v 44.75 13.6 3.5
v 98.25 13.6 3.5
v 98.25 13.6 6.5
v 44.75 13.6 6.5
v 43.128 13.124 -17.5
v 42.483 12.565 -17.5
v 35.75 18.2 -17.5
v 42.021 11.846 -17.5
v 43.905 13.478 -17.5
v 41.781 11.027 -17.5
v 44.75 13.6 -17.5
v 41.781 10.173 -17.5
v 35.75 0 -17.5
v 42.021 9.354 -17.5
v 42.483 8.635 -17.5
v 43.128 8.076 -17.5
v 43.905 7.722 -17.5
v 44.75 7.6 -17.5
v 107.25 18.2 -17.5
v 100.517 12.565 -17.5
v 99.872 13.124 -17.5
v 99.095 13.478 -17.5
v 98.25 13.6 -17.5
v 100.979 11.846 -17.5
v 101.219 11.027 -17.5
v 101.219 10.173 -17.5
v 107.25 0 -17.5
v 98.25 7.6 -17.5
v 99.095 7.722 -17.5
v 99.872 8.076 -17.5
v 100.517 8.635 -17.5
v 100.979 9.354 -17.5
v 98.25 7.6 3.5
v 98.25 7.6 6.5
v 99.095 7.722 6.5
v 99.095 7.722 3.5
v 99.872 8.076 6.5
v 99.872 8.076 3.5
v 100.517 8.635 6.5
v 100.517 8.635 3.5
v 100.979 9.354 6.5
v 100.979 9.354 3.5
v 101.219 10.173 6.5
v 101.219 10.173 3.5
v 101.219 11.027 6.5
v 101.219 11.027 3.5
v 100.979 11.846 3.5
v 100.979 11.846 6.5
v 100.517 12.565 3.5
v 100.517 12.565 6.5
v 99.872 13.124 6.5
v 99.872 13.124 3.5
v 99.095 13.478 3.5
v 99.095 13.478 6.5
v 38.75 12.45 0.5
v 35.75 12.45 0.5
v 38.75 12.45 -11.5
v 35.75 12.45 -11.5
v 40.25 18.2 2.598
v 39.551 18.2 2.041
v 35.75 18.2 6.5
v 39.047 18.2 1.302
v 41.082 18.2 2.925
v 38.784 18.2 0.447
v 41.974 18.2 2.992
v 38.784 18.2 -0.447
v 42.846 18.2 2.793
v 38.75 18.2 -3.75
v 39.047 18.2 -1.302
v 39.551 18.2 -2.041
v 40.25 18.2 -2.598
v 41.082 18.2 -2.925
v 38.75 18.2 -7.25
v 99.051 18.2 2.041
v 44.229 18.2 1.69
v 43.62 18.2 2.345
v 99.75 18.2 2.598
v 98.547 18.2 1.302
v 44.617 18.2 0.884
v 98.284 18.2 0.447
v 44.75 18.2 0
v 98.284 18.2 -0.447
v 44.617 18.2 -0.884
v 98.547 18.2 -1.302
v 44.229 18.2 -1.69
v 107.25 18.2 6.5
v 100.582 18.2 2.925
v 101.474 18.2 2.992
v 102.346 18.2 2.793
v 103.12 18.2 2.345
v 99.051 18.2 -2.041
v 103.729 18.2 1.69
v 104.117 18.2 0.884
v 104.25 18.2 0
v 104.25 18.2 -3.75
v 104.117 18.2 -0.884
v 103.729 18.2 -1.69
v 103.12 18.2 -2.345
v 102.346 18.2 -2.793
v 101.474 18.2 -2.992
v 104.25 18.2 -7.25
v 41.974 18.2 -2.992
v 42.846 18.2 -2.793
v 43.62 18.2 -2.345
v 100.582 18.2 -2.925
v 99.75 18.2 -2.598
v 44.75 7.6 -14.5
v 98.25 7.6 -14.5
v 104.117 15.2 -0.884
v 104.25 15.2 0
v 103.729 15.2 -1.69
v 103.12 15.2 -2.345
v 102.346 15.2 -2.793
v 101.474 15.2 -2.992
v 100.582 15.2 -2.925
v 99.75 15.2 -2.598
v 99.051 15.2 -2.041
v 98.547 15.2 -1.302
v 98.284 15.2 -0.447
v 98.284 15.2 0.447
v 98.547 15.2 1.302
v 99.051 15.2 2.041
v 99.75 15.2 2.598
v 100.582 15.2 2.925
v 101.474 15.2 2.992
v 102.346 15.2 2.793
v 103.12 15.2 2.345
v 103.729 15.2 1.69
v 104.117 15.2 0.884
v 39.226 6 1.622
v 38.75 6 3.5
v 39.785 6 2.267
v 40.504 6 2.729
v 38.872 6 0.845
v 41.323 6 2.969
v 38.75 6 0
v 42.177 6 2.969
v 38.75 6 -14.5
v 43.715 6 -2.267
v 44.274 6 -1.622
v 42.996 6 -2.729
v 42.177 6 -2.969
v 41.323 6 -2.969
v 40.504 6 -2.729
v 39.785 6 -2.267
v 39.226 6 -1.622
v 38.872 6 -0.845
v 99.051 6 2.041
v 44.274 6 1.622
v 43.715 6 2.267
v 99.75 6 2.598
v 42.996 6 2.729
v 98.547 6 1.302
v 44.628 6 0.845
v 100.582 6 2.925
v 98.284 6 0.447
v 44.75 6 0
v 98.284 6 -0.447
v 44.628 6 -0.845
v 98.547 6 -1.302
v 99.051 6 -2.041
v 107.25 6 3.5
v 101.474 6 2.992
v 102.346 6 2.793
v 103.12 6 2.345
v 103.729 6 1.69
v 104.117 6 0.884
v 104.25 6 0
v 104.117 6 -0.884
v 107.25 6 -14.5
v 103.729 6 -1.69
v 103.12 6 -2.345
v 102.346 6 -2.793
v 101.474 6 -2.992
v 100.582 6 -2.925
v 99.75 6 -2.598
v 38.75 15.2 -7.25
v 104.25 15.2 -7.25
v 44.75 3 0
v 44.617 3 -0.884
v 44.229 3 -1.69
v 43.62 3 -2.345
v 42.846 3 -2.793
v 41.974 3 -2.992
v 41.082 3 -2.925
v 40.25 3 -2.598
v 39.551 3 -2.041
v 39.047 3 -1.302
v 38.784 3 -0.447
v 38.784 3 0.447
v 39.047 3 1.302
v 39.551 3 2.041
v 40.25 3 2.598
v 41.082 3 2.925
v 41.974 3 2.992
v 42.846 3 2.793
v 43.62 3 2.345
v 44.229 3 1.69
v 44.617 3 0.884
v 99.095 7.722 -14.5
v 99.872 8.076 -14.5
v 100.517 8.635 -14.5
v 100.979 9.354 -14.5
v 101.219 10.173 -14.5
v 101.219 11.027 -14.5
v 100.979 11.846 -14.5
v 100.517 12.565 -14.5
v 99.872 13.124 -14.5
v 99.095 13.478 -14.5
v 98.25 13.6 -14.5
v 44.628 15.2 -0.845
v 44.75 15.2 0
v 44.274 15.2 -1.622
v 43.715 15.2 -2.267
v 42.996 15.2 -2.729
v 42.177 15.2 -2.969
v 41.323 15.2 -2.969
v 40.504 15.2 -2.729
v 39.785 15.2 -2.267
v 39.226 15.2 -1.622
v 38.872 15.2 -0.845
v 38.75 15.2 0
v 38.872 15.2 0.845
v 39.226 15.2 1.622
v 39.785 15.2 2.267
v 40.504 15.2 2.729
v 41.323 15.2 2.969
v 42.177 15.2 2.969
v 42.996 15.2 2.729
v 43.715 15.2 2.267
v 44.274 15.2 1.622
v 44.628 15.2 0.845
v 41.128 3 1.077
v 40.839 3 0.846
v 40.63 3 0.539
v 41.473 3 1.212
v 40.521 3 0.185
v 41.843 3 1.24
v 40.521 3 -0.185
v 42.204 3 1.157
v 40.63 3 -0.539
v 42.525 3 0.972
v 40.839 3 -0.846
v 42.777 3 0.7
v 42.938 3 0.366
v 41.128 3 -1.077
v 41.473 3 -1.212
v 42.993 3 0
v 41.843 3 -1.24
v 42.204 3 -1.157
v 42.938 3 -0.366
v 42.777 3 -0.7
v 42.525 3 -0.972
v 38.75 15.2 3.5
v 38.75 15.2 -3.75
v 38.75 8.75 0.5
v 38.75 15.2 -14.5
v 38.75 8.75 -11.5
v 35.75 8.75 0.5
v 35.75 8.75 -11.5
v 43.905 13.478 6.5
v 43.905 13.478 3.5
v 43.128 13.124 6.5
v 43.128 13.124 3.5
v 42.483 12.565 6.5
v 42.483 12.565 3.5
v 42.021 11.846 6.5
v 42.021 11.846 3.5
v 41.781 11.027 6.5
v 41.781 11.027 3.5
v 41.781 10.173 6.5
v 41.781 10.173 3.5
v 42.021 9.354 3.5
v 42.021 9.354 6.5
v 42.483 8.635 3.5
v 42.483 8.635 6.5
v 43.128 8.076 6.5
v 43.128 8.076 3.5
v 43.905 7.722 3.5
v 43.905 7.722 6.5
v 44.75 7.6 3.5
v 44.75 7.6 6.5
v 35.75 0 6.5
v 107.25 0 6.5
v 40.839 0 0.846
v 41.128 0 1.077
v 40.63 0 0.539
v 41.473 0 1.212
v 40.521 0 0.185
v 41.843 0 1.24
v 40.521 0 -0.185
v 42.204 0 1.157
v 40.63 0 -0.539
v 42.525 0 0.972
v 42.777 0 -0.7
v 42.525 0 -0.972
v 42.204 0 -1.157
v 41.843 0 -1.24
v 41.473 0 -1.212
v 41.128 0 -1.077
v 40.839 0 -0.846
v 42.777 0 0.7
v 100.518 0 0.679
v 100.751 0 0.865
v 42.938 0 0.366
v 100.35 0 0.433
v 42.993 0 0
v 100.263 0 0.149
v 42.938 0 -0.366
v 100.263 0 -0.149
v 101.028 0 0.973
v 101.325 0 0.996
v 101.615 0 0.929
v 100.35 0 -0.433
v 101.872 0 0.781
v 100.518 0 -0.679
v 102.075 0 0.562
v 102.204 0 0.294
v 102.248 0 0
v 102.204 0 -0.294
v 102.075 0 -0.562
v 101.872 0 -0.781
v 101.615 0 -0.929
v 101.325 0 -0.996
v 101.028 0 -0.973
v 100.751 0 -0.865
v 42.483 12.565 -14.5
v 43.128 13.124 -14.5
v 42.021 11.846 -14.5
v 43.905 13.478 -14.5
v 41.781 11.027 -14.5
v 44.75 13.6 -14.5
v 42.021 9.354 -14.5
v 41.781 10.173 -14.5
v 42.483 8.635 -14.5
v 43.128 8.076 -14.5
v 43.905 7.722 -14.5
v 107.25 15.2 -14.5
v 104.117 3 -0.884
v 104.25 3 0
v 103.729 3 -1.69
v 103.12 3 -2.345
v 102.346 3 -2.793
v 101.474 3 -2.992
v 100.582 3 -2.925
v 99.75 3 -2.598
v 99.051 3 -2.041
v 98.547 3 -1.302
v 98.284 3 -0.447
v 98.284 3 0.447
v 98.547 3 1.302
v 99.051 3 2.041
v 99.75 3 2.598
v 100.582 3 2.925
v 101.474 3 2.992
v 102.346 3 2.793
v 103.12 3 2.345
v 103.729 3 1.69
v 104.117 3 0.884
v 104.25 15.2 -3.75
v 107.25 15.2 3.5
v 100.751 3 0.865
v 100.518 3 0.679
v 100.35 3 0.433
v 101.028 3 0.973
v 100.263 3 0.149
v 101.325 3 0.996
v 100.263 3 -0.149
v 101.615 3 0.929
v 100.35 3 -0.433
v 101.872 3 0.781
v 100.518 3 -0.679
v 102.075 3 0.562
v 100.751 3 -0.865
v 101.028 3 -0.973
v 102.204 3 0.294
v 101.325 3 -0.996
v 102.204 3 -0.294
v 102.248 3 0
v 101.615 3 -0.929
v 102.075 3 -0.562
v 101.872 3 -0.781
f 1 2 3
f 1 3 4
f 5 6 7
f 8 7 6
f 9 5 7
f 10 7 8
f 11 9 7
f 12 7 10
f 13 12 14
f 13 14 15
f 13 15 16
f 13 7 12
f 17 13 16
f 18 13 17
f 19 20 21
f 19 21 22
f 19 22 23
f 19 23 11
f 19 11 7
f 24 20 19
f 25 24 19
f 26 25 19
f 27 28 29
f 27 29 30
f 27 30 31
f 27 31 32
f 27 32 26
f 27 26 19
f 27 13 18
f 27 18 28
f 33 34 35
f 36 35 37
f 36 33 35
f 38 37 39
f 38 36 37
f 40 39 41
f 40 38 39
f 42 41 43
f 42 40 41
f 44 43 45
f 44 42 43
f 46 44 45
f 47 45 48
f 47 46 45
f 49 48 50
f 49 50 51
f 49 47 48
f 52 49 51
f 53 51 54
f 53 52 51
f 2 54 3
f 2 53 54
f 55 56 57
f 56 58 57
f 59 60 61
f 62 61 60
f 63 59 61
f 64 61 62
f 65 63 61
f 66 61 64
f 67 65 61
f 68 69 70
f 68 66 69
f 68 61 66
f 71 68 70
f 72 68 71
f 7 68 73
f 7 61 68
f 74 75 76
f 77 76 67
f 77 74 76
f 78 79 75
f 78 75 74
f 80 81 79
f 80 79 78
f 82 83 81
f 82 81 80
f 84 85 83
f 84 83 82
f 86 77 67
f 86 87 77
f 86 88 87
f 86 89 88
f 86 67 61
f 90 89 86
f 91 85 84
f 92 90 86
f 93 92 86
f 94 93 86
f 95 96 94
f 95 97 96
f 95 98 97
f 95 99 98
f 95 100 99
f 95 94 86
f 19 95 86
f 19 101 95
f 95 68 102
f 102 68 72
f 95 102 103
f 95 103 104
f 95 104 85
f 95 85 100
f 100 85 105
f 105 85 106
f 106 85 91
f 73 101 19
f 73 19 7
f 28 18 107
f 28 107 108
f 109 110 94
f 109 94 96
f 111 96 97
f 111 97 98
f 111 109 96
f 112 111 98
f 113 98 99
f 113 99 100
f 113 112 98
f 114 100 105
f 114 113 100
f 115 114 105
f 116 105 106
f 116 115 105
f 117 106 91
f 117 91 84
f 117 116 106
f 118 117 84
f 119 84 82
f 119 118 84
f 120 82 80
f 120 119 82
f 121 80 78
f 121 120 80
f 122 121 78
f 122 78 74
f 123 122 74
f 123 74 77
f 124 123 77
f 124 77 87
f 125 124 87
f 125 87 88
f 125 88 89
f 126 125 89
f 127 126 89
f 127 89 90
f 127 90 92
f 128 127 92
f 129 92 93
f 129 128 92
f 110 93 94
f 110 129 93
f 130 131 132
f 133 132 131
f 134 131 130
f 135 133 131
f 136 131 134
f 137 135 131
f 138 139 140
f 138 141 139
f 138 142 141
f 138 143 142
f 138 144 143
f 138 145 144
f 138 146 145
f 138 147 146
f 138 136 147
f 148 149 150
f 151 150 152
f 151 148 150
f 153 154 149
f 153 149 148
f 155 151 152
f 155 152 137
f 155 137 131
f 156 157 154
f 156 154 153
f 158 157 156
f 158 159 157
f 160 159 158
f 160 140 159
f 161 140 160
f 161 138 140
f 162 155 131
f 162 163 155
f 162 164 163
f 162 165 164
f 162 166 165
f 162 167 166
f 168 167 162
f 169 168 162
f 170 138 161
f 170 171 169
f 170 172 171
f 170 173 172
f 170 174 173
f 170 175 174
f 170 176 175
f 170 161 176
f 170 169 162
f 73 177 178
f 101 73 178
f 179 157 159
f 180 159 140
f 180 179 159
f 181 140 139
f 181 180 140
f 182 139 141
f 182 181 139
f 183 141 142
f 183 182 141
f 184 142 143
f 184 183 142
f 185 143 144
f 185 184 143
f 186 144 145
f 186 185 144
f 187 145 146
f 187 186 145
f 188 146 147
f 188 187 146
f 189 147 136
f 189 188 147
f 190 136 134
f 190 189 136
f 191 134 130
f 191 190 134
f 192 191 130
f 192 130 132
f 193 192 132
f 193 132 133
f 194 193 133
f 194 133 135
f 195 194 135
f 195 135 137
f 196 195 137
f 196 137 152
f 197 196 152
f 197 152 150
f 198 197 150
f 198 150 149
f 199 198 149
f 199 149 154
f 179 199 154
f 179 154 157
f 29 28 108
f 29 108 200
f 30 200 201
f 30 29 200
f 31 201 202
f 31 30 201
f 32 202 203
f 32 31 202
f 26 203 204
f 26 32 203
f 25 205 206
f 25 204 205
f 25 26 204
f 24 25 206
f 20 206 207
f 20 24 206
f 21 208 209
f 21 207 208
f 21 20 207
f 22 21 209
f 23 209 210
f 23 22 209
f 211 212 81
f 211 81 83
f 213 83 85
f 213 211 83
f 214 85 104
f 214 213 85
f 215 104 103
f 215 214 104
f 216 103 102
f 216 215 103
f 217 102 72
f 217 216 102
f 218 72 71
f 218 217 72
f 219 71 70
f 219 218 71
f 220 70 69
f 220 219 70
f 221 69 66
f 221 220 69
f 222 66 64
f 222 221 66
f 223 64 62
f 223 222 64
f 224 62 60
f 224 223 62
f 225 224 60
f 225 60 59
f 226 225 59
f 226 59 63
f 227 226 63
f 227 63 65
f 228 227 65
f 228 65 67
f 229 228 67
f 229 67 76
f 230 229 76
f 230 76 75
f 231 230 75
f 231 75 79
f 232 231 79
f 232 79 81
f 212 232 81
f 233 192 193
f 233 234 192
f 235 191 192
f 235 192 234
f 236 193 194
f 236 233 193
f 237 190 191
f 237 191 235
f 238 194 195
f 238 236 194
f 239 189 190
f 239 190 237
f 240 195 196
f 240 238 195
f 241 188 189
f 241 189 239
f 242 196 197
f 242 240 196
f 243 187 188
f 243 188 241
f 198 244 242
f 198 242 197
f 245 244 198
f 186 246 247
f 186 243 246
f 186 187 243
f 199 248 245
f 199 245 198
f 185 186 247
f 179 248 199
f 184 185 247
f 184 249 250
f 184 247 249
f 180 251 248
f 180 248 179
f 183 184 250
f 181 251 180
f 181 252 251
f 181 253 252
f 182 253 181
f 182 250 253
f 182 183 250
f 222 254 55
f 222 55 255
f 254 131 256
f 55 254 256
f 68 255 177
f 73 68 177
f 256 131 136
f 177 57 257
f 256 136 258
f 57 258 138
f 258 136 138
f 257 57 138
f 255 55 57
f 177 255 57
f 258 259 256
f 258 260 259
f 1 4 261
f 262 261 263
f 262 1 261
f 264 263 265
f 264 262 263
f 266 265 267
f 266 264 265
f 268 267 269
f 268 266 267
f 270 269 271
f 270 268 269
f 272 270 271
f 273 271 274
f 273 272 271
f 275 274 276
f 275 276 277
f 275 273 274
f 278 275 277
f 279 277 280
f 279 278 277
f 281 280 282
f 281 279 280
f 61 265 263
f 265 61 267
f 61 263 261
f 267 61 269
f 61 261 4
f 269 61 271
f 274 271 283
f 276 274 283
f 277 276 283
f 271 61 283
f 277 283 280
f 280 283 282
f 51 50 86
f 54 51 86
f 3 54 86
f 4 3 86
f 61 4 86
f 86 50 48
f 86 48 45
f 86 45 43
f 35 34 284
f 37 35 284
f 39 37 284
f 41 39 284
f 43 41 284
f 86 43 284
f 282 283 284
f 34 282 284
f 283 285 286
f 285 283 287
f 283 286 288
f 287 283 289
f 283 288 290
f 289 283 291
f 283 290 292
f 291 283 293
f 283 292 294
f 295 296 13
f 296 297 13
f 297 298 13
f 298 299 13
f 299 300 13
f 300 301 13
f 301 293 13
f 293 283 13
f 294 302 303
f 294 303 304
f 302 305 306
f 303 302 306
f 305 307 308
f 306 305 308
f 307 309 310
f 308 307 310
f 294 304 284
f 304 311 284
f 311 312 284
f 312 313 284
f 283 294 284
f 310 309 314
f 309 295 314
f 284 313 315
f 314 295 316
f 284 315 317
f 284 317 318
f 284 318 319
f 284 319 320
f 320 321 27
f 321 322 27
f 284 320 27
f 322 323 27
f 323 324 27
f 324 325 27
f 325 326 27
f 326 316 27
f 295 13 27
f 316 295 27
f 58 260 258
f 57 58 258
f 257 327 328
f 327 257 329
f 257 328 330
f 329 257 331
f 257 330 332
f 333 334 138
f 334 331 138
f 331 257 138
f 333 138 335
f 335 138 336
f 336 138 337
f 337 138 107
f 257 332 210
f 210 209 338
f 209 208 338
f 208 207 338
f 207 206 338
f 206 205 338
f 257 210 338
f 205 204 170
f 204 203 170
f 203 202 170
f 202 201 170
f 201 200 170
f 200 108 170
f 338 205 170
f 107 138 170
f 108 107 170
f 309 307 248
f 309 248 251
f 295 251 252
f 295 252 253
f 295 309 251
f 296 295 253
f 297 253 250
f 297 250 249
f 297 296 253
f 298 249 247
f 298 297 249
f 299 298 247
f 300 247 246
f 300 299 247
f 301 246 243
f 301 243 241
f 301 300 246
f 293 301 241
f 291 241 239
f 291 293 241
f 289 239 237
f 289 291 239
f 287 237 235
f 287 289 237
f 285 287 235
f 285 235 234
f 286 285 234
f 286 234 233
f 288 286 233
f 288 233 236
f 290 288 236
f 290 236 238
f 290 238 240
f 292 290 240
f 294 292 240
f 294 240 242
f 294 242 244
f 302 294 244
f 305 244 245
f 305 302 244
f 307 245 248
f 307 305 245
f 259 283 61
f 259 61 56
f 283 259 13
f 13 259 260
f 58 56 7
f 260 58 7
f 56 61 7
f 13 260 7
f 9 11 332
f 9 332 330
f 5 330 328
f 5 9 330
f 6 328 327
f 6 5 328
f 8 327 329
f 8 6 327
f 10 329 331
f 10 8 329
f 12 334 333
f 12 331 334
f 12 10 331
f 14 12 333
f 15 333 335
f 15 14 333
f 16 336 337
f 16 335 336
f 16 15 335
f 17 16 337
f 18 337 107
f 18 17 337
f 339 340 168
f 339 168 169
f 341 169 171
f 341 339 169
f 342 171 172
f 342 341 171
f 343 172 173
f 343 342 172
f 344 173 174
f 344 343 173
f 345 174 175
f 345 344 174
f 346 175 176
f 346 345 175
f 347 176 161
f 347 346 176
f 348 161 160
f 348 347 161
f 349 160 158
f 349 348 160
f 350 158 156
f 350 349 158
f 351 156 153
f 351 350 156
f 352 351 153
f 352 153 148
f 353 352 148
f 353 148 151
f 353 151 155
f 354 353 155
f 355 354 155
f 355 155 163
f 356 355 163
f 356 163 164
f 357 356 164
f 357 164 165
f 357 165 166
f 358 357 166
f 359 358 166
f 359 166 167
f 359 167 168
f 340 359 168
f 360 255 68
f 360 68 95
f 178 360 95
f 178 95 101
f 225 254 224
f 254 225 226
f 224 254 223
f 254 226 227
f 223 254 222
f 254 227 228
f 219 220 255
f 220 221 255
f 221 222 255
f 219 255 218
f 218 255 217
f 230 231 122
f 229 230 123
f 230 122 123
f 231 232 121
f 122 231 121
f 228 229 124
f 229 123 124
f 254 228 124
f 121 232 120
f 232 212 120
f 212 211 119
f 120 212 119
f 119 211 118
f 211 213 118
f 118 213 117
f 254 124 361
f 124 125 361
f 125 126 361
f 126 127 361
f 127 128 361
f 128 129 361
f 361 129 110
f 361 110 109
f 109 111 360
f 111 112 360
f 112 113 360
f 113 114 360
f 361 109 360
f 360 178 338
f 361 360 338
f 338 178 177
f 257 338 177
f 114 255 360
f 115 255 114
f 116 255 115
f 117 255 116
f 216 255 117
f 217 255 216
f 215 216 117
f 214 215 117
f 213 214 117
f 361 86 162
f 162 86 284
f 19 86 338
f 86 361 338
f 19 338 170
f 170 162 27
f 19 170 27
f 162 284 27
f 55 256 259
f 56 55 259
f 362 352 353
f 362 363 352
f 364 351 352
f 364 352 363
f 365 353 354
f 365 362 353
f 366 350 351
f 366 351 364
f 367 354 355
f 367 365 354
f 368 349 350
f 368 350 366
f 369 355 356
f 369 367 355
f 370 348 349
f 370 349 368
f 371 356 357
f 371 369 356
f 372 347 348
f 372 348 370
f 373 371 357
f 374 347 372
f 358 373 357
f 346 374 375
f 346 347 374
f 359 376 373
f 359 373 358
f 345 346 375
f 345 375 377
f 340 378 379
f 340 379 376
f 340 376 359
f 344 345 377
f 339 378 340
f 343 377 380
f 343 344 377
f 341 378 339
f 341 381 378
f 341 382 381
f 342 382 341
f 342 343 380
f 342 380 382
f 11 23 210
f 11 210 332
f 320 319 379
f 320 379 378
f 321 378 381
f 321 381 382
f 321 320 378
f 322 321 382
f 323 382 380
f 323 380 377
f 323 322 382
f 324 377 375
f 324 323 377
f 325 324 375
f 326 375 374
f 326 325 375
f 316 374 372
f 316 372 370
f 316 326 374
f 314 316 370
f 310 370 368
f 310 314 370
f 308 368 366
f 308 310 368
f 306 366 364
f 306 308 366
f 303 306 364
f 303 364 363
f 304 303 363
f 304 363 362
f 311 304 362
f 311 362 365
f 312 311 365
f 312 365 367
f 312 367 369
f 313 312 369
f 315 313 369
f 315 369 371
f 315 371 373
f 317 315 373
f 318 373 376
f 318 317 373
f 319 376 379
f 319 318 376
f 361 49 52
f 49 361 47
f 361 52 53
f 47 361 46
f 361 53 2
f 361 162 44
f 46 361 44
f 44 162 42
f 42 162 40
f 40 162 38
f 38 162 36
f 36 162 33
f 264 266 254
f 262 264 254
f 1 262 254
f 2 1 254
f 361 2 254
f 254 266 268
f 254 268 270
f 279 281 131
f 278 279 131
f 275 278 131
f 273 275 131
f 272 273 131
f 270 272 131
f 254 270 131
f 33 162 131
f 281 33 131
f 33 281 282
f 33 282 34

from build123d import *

# Parameters (mm, degrees)
SKETCH1_W              = 65.5
SKETCH1_H              = 9
SKETCH1_R              = 0.998395378
SKETCH1_R_2            = 1.243115981
BOSS_EXTRUDE1_DEPTH    = 6
SKETCH3_W              = 65.5
SKETCH3_H              = 6
BOSS_EXTRUDE2_DEPTH    = 10
SKETCH4_W              = 65.5
SKETCH4_H              = 6
BOSS_EXTRUDE3_DEPTH    = 2
SKETCH5_W              = 65.5
SKETCH5_H              = 3
BOSS_EXTRUDE4_DEPTH    = 9.2
SKETCH7_W              = 21
SKETCH7_H              = 15.2
BOSS_EXTRUDE6_DEPTH    = 3
SKETCH12_W             = 68.5
SKETCH12_H             = 15.2
BOSS_EXTRUDE10_DEPTH   = 3
SKETCH13_W             = 24
SKETCH13_H             = 15.2
SKETCH13_W_2           = 12
SKETCH13_H_2           = 3.7
BOSS_EXTRUDE11_DEPTH   = 3
CUT_EXTRUDE2_DEPTH     = 46.662922596
SKETCH11_W             = 18
SKETCH11_H             = 9.2
CUT_EXTRUDE4_DEPTH     = 3
SKETCH14_W             = 71.5
SKETCH14_H             = 24
BOSS_EXTRUDE12_DEPTH   = 3
SKETCH15_W             = 65.5
SKETCH15_H             = 3.5
CUT_EXTRUDE5_DEPTH     = 3
SKETCH16_R             = 3
CUT_EXTRUDE6_DEPTH     = 15.2
MIRROR10_OUTLINE_W     = 71.5
MIRROR10_OUTLINE_H     = 24
MIRROR10_OUTLINE_R     = 3
MIRROR10_DEPTH         = 6
MIRROR10_START         = 6
MIRROR10_2_DEPTH       = 12.2
MIRROR10_START_2       = 15.2
MIRROR10_3_OUTLINE_W   = 65.5
MIRROR10_3_OUTLINE_H   = 3.5
MIRROR10_3_OUTLINE_R   = 3
MIRROR10_3_DEPTH       = 3
MIRROR10_4_OUTLINE_R   = 3
MIRROR10_4_OUTLINE_R_2 = 1.243115981
MIRROR10_4_OUTLINE_R_3 = 0.998395378
MIRROR10_4_DEPTH       = 3
MIRROR10_5_OUTLINE_W   = 3
MIRROR10_5_OUTLINE_H   = 12
MIRROR10_5_DEPTH       = 2.75
MIRROR10_START_3       = 12.45
MIRROR10_6_OUTLINE_W   = 3
MIRROR10_6_OUTLINE_H   = 12
MIRROR10_6_DEPTH       = 2.75
MIRROR10_START_4       = -17.5
MIRROR10_7_DEPTH       = 24
SKETCH17_W             = 71.5
SKETCH17_H             = 24
CUT_EXTRUDE7_DEPTH     = 111.181906409


with BuildPart() as part:
    # Sketch1 → Boss-Extrude1 (new body)
    with BuildSketch(Plane(origin=(0, 0, 0), x_dir=(1, 0, 0), z_dir=(0, 1, 0))):
        Rectangle(SKETCH1_W, SKETCH1_H)
        with Locations(Location((-29.75, 0, 0), (0, 0, 270))):
            Circle(SKETCH1_R, mode=Mode.SUBTRACT)
        with Locations(Location((29.75, 0, 0), (0, 0, 270))):
            Circle(SKETCH1_R_2, mode=Mode.SUBTRACT)
    extrude(amount=BOSS_EXTRUDE1_DEPTH)

    # Sketch3 → Boss-Extrude2 (add)
    with BuildSketch(Plane(origin=(0, 0, -4.5), x_dir=(-1, 0, 0), z_dir=(0, 0, -1))):
        with Locations((0, 3)):
            Rectangle(SKETCH3_W, SKETCH3_H)
    extrude(amount=BOSS_EXTRUDE2_DEPTH)

    # Sketch4 → Boss-Extrude3 (add)
    with BuildSketch(Plane.XY.offset(4.5)):
        with Locations((0, 3)):
            Rectangle(SKETCH4_W, SKETCH4_H)
    extrude(amount=BOSS_EXTRUDE3_DEPTH)

    # Sketch5 → Boss-Extrude4 (add)
    with BuildSketch(Plane(origin=(0, 6, 0), x_dir=(1, 0, 0), z_dir=(0, 1, 0))):
        with Locations((0, -5)):
            Rectangle(SKETCH5_W, SKETCH5_H)
    extrude(amount=BOSS_EXTRUDE4_DEPTH)

    # Sketch7 → Boss-Extrude6 (add)
    with BuildSketch(Plane.ZY.offset(32.75)):
        with Locations((-4, 7.6)):
            Rectangle(SKETCH7_W, SKETCH7_H)
    extrude(amount=BOSS_EXTRUDE6_DEPTH)

    # Sketch12 → Boss-Extrude10 (add)
    with BuildSketch(Plane(origin=(0, 0, -14.5), x_dir=(-1, 0, 0), z_dir=(0, 0, -1))):
        with Locations((1.5, 7.6)):
            Rectangle(SKETCH12_W, SKETCH12_H)
    extrude(amount=BOSS_EXTRUDE10_DEPTH)

    # Sketch13 → Boss-Extrude11 (add)
    with BuildSketch(Plane(origin=(32.75, 0, 0), x_dir=(0, 0, -1), z_dir=(1, 0, 0))):
        with Locations((5.5, 7.6)):
            Rectangle(SKETCH13_W, SKETCH13_H)
        with Locations((5.5, 10.6)):
            Rectangle(SKETCH13_W_2, SKETCH13_H_2, mode=Mode.SUBTRACT)
    extrude(amount=BOSS_EXTRUDE11_DEPTH)

    # Sketch6 → Cut-Extrude2 (cut, through all)
    with BuildSketch(Plane.XY.offset(6.5)):
        with BuildLine():
            ThreePointArc((-23.75, 10.6), (-24.628679656, 12.721320344), (-26.75, 13.6))
            Line((-26.75, 13.6), (-26.75, 7.6))
            ThreePointArc((-26.75, 7.6), (-24.628679656, 8.478679656), (-23.75, 10.6))
        make_face()
        with BuildLine():
            Line((-26.75, 7.6), (-26.75, 13.6))
            ThreePointArc((-26.75, 13.6), (-29.75, 10.6), (-26.75, 7.6))
        make_face()
        with BuildLine():
            ThreePointArc((29.75, 10.6), (28.871320344, 12.721320344), (26.75, 13.6))
            Line((26.75, 13.6), (26.75, 7.6))
            ThreePointArc((26.75, 7.6), (28.871320344, 8.478679656), (29.75, 10.6))
        make_face()
        with BuildLine():
            Line((26.75, 7.6), (26.75, 13.6))
            ThreePointArc((26.75, 13.6), (23.75, 10.6), (26.75, 7.6))
        make_face()
        with BuildLine():
            Line((26.75, 13.6), (-26.75, 13.6))
            ThreePointArc((-26.75, 13.6), (-24.628679656, 12.721320344), (-23.75, 10.6))
            ThreePointArc((-23.75, 10.6), (-24.628679656, 8.478679656), (-26.75, 7.6))
            Line((-26.75, 7.6), (26.75, 7.6))
            ThreePointArc((26.75, 7.6), (23.75, 10.6), (26.75, 13.6))
        make_face()
    extrude(amount=-CUT_EXTRUDE2_DEPTH, mode=Mode.SUBTRACT)

    # Sketch11 → Cut-Extrude4 (cut)
    with BuildSketch(Plane.ZY.offset(35.75)):
        with Locations((-5.5, 10.6)):
            Rectangle(SKETCH11_W, SKETCH11_H)
    extrude(amount=-CUT_EXTRUDE4_DEPTH, mode=Mode.SUBTRACT)

    # Sketch14 → Boss-Extrude12 (add)
    with BuildSketch(Plane(origin=(0, 15.2, 0), x_dir=(1, 0, 0), z_dir=(0, 1, 0))):
        with Locations((0, 5.5)):
            Rectangle(SKETCH14_W, SKETCH14_H)
    extrude(amount=BOSS_EXTRUDE12_DEPTH)

    # Sketch15 → Cut-Extrude5 (cut)
    with BuildSketch(Plane(origin=(0, 18.2, 0), x_dir=(1, 0, 0), z_dir=(0, 1, 0))):
        with Locations((0, 5.5)):
            Rectangle(SKETCH15_W, SKETCH15_H)
    extrude(amount=-CUT_EXTRUDE5_DEPTH, mode=Mode.SUBTRACT)

    # Sketch16 → Cut-Extrude6 (cut)
    with BuildSketch(Plane(origin=(0, 18.2, 0), x_dir=(1, 0, 0), z_dir=(0, 1, 0))):
        with Locations(Location((-29.75, 0, 0), (0, 0, 270))):
            Circle(SKETCH16_R)
        with Locations(Location((29.75, 0, 0), (0, 0, 270))):
            Circle(SKETCH16_R)
    extrude(amount=-CUT_EXTRUDE6_DEPTH, mode=Mode.SUBTRACT)

    # Mirror10: read off the stored shape, not the designer's step
    # Mirror10 outline → Mirror10 (add)
    with BuildSketch(Plane(origin=(0, 0, 0), x_dir=(1, 0, 0), z_dir=(0, 1, 0))):
        with Locations((71.5, 5.5)):
            Rectangle(MIRROR10_OUTLINE_W, MIRROR10_OUTLINE_H)
        with Locations((41.75, 0)):
            Circle(MIRROR10_OUTLINE_R, mode=Mode.SUBTRACT)
        with Locations((101.25, 0)):
            Circle(MIRROR10_OUTLINE_R, mode=Mode.SUBTRACT)
    extrude(amount=MIRROR10_DEPTH)

    # Mirror10 2 outline → Mirror10 2 (add)
    with BuildSketch(Plane(origin=(0, 0, 0), x_dir=(1, 0, 0), z_dir=(0, 1, 0)).offset(MIRROR10_START)):
        Polygon((35.75, -0.5), (35.75, -6.5), (107.25, -6.5), (107.25, -3.5), (38.75, -3.5), (38.75, -0.5), align=None)
        Polygon((35.75, 17.5), (35.75, 11.5), (38.75, 11.5), (38.75, 14.5), (107.25, 14.5), (107.25, 17.5), align=None)
    extrude(amount=MIRROR10_2_DEPTH)

    # Mirror10 3 outline → Mirror10 3 (add)
    with BuildSketch(Plane(origin=(0, 0, 0), x_dir=(1, 0, 0), z_dir=(0, 1, 0)).offset(MIRROR10_START_2)):
        Polygon((35.75, 11.5), (35.75, -0.5), (38.75, -0.5), (38.75, -3.5), (107.25, -3.5), (107.25, 14.5), (38.75, 14.5), (38.75, 11.5), align=None)
        with Locations((71.5, 5.5)):
            Rectangle(MIRROR10_3_OUTLINE_W, MIRROR10_3_OUTLINE_H, mode=Mode.SUBTRACT)
        with Locations((41.75, 0)):
            Circle(MIRROR10_3_OUTLINE_R, mode=Mode.SUBTRACT)
        with Locations((101.25, 0)):
            Circle(MIRROR10_3_OUTLINE_R, mode=Mode.SUBTRACT)
    extrude(amount=MIRROR10_3_DEPTH)

    # Mirror10 4 outline → Mirror10 4 (add)
    # profile 1 of 2: a face of its own
    with BuildSketch(Plane(origin=(0, 0, 0), x_dir=(1, 0, 0), z_dir=(0, 1, 0))):
        with Locations((41.75, 0)):
            Circle(MIRROR10_4_OUTLINE_R)
        with Locations((41.75, 0)):
            Circle(MIRROR10_4_OUTLINE_R_2, mode=Mode.SUBTRACT)
    # profile 2 of 2: a face of its own
    with BuildSketch(Plane(origin=(0, 0, 0), x_dir=(1, 0, 0), z_dir=(0, 1, 0))):
        with Locations((101.25, 0)):
            Circle(MIRROR10_4_OUTLINE_R)
        with Locations((101.25, 0)):
            Circle(MIRROR10_4_OUTLINE_R_3, mode=Mode.SUBTRACT)
    extrude(amount=MIRROR10_4_DEPTH)

    # Mirror10 5 outline → Mirror10 5 (add)
    with BuildSketch(Plane(origin=(0, 0, 0), x_dir=(1, 0, 0), z_dir=(0, 1, 0)).offset(MIRROR10_START)):
        with Locations((37.25, 5.5)):
            Rectangle(MIRROR10_5_OUTLINE_W, MIRROR10_5_OUTLINE_H)
    extrude(amount=MIRROR10_5_DEPTH)

    # Mirror10 6 outline → Mirror10 6 (add)
    with BuildSketch(Plane(origin=(0, 0, 0), x_dir=(1, 0, 0), z_dir=(0, 1, 0)).offset(MIRROR10_START_3)):
        with Locations((37.25, 5.5)):
            Rectangle(MIRROR10_6_OUTLINE_W, MIRROR10_6_OUTLINE_H)
    extrude(amount=MIRROR10_6_DEPTH)

    # Mirror10 7 outline → Mirror10 7 (cut)
    with BuildSketch(Plane.XY.offset(MIRROR10_START_4)):
        with BuildLine():
            Line((44.75, 7.6), (98.25, 7.6))
            ThreePointArc((98.25, 7.6), (101.25, 10.6), (98.25, 13.6))
            Line((98.25, 13.6), (44.75, 13.6))
            ThreePointArc((44.75, 13.6), (41.75, 10.6), (44.75, 7.6))
        make_face()
    extrude(amount=MIRROR10_7_DEPTH, mode=Mode.SUBTRACT)

    # Sketch17 → Cut-Extrude7 (cut, through all)
    with BuildSketch(Plane(origin=(0, 18.2, 0), x_dir=(1, 0, 0), z_dir=(0, 1, 0))):
        with Locations((0, 5.5)):
            Rectangle(SKETCH17_W, SKETCH17_H)
    extrude(amount=-CUT_EXTRUDE7_DEPTH, mode=Mode.SUBTRACT)


solid = part.part
